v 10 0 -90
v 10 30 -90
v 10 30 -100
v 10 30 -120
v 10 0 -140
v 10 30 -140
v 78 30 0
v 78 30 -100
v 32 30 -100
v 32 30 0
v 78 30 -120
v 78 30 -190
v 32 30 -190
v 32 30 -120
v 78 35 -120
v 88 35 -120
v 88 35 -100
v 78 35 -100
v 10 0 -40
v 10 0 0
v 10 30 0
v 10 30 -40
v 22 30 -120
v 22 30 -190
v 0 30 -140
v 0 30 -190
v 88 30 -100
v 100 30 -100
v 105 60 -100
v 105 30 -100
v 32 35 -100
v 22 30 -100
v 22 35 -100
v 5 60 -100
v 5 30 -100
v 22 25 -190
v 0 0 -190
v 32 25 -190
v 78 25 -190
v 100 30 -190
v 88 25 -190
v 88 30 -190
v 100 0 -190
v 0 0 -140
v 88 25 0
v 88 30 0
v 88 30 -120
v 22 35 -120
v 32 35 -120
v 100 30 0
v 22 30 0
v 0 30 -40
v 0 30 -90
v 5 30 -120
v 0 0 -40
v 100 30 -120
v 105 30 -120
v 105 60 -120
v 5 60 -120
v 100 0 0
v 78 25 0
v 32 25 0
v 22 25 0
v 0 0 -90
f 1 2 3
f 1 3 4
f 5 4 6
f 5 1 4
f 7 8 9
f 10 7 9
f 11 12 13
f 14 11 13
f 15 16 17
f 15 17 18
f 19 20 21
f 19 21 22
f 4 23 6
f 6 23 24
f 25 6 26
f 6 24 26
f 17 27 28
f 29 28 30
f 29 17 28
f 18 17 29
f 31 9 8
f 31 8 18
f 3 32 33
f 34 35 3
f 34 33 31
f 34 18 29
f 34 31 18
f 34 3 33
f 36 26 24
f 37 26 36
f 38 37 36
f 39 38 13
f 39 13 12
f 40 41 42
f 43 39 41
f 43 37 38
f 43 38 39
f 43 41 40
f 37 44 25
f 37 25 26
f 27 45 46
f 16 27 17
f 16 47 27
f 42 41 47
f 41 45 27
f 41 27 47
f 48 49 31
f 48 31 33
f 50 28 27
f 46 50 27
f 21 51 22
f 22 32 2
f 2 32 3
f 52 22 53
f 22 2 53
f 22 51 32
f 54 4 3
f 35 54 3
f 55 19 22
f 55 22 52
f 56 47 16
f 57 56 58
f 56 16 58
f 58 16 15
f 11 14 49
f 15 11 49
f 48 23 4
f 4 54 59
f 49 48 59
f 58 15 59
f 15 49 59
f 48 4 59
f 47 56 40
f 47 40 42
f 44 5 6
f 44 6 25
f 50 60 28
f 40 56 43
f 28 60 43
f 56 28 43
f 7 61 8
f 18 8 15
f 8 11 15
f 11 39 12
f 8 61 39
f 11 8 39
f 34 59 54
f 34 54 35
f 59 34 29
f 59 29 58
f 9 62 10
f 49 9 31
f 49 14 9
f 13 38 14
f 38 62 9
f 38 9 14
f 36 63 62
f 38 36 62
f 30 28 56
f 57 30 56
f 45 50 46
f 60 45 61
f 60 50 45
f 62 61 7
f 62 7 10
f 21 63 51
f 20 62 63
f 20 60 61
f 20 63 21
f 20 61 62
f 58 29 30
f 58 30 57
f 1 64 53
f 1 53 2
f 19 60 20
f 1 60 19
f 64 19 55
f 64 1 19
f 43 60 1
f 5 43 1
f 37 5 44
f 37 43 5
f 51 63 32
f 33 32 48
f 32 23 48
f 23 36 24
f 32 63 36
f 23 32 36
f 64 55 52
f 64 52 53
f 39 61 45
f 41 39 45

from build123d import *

# Parameters (mm, degrees)
BOSS_EXTRUDE2_DEPTH    = 30
SKETCH2_W              = 10
SKETCH2_H              = 190
CUT_EXTRUDE8_DEPTH     = 5
SKETCH7_W              = 10
SKETCH7_H              = 190
CUT_EXTRUDE9_DEPTH     = 5
SKETCH10_W             = 90
SKETCH10_H             = 20
BOSS_EXTRUDE9_DEPTH    = 30
SKETCH16_W             = 10
SKETCH16_H             = 5
CUT_EXTRUDE11_DEPTH    = 34
SKETCH18_W             = 10
SKETCH18_H             = 5
CUT_EXTRUDE12_DEPTH    = 36
SPLIT3_SURFACE_1_BACK  = 223.935
SPLIT3_SURFACE_1_DEPTH = 447.87
SPLIT3_SURFACE_2_BACK  = 223.935
SPLIT3_SURFACE_2_DEPTH = 447.87
SKETCH24_W             = 20
SKETCH24_H             = 30
BOSS_EXTRUDE10_DEPTH   = 5
SKETCH25_W             = 20
SKETCH25_H             = 30
BOSS_EXTRUDE11_DEPTH   = 5


with BuildPart() as part:
    # Sketch1 → Boss-Extrude2 (new body)
    with BuildSketch(Plane(origin=(0, 0, 0), x_dir=(1, 0, 0), z_dir=(0, 1, 0))):
        Polygon((10, 0), (10, 40), (0, 40), (0, 90), (10, 90), (10, 140), (0, 140), (0, 190), (100, 190), (100, 0), align=None)
    extrude(amount=BOSS_EXTRUDE2_DEPTH)

    # Sketch2 → Cut-Extrude8 (cut)
    with BuildSketch(Plane(origin=(0, 30, 0), x_dir=(1, 0, 0), z_dir=(0, 1, 0))):
        with Locations((27, 95)):
            Rectangle(SKETCH2_W, SKETCH2_H)
    extrude(amount=-CUT_EXTRUDE8_DEPTH, mode=Mode.SUBTRACT)

    # Sketch7 → Cut-Extrude9 (cut)
    with BuildSketch(Plane(origin=(0, 30, 0), x_dir=(1, 0, 0), z_dir=(0, 1, 0))):
        with Locations((83, 95)):
            Rectangle(SKETCH7_W, SKETCH7_H)
    extrude(amount=-CUT_EXTRUDE9_DEPTH, mode=Mode.SUBTRACT)

    # Sketch10 → Boss-Extrude9 (add)
    with BuildSketch(Plane(origin=(0, 30, 0), x_dir=(1, 0, 0), z_dir=(0, 1, 0))):
        with Locations((55, 110)):
            Rectangle(SKETCH10_W, SKETCH10_H)
    extrude(amount=BOSS_EXTRUDE9_DEPTH)

    # Sketch16 → Cut-Extrude11 (cut)
    with BuildSketch(Plane(origin=(0, 0, -120), x_dir=(-1, 0, 0), z_dir=(0, 0, -1))):
        with Locations((-83, 32.5)):
            Rectangle(SKETCH16_W, SKETCH16_H)
    extrude(amount=-CUT_EXTRUDE11_DEPTH, mode=Mode.SUBTRACT)

    # Sketch18 → Cut-Extrude12 (cut)
    with BuildSketch(Plane(origin=(0, 0, -120), x_dir=(-1, 0, 0), z_dir=(0, 0, -1))):
        with Locations((-27, 32.5)):
            Rectangle(SKETCH18_W, SKETCH18_H)
    extrude(amount=-CUT_EXTRUDE12_DEPTH, mode=Mode.SUBTRACT)


with BuildPart() as body_2:
    # Split3: the piece behind the surface
    add(part.part)
    # Split3 surface: a surface, the sketch's curves swept straight by 447.87 mm
    with BuildLine(Plane.ZY.offset(-10).offset(-SPLIT3_SURFACE_1_BACK), mode=Mode.PRIVATE) as split3_surface_1_path:
        Line((-120, 30), (-100, 30))
    split3_surface_1 = Shell.extrude(split3_surface_1_path.wire(), (-1 * SPLIT3_SURFACE_1_DEPTH, 0 * SPLIT3_SURFACE_1_DEPTH, 0 * SPLIT3_SURFACE_1_DEPTH))
    split(bisect_by=split3_surface_1, keep=Keep.BOTTOM)


with BuildPart() as part_1:
    add(part.part)

    # Split3: split by a surface, the side it looks to stays
    # Split3 surface: a surface, the sketch's curves swept straight by 447.87 mm
    with BuildLine(Plane.ZY.offset(-10).offset(-SPLIT3_SURFACE_2_BACK), mode=Mode.PRIVATE) as split3_surface_2_path:
        Line((-120, 30), (-100, 30))
    split3_surface_2 = Shell.extrude(split3_surface_2_path.wire(), (-1 * SPLIT3_SURFACE_2_DEPTH, 0 * SPLIT3_SURFACE_2_DEPTH, 0 * SPLIT3_SURFACE_2_DEPTH))
    split(bisect_by=split3_surface_2, keep=Keep.TOP)

    add(body_2.part)  # Boss-Extrude10 merges body 2
    # Sketch24 → Boss-Extrude10 (add)
    with BuildSketch(Plane.ZY.offset(-10)):
        with Locations((-110, 45)):
            Rectangle(SKETCH24_W, SKETCH24_H)
    extrude(amount=BOSS_EXTRUDE10_DEPTH)

    # Sketch25 → Boss-Extrude11 (add)
    with BuildSketch(Plane(origin=(100, 0, 0), x_dir=(0, 0, -1), z_dir=(1, 0, 0))):
        with Locations((110, 45)):
            Rectangle(SKETCH25_W, SKETCH25_H)
    extrude(amount=BOSS_EXTRUDE11_DEPTH)


solid = part_1.part
